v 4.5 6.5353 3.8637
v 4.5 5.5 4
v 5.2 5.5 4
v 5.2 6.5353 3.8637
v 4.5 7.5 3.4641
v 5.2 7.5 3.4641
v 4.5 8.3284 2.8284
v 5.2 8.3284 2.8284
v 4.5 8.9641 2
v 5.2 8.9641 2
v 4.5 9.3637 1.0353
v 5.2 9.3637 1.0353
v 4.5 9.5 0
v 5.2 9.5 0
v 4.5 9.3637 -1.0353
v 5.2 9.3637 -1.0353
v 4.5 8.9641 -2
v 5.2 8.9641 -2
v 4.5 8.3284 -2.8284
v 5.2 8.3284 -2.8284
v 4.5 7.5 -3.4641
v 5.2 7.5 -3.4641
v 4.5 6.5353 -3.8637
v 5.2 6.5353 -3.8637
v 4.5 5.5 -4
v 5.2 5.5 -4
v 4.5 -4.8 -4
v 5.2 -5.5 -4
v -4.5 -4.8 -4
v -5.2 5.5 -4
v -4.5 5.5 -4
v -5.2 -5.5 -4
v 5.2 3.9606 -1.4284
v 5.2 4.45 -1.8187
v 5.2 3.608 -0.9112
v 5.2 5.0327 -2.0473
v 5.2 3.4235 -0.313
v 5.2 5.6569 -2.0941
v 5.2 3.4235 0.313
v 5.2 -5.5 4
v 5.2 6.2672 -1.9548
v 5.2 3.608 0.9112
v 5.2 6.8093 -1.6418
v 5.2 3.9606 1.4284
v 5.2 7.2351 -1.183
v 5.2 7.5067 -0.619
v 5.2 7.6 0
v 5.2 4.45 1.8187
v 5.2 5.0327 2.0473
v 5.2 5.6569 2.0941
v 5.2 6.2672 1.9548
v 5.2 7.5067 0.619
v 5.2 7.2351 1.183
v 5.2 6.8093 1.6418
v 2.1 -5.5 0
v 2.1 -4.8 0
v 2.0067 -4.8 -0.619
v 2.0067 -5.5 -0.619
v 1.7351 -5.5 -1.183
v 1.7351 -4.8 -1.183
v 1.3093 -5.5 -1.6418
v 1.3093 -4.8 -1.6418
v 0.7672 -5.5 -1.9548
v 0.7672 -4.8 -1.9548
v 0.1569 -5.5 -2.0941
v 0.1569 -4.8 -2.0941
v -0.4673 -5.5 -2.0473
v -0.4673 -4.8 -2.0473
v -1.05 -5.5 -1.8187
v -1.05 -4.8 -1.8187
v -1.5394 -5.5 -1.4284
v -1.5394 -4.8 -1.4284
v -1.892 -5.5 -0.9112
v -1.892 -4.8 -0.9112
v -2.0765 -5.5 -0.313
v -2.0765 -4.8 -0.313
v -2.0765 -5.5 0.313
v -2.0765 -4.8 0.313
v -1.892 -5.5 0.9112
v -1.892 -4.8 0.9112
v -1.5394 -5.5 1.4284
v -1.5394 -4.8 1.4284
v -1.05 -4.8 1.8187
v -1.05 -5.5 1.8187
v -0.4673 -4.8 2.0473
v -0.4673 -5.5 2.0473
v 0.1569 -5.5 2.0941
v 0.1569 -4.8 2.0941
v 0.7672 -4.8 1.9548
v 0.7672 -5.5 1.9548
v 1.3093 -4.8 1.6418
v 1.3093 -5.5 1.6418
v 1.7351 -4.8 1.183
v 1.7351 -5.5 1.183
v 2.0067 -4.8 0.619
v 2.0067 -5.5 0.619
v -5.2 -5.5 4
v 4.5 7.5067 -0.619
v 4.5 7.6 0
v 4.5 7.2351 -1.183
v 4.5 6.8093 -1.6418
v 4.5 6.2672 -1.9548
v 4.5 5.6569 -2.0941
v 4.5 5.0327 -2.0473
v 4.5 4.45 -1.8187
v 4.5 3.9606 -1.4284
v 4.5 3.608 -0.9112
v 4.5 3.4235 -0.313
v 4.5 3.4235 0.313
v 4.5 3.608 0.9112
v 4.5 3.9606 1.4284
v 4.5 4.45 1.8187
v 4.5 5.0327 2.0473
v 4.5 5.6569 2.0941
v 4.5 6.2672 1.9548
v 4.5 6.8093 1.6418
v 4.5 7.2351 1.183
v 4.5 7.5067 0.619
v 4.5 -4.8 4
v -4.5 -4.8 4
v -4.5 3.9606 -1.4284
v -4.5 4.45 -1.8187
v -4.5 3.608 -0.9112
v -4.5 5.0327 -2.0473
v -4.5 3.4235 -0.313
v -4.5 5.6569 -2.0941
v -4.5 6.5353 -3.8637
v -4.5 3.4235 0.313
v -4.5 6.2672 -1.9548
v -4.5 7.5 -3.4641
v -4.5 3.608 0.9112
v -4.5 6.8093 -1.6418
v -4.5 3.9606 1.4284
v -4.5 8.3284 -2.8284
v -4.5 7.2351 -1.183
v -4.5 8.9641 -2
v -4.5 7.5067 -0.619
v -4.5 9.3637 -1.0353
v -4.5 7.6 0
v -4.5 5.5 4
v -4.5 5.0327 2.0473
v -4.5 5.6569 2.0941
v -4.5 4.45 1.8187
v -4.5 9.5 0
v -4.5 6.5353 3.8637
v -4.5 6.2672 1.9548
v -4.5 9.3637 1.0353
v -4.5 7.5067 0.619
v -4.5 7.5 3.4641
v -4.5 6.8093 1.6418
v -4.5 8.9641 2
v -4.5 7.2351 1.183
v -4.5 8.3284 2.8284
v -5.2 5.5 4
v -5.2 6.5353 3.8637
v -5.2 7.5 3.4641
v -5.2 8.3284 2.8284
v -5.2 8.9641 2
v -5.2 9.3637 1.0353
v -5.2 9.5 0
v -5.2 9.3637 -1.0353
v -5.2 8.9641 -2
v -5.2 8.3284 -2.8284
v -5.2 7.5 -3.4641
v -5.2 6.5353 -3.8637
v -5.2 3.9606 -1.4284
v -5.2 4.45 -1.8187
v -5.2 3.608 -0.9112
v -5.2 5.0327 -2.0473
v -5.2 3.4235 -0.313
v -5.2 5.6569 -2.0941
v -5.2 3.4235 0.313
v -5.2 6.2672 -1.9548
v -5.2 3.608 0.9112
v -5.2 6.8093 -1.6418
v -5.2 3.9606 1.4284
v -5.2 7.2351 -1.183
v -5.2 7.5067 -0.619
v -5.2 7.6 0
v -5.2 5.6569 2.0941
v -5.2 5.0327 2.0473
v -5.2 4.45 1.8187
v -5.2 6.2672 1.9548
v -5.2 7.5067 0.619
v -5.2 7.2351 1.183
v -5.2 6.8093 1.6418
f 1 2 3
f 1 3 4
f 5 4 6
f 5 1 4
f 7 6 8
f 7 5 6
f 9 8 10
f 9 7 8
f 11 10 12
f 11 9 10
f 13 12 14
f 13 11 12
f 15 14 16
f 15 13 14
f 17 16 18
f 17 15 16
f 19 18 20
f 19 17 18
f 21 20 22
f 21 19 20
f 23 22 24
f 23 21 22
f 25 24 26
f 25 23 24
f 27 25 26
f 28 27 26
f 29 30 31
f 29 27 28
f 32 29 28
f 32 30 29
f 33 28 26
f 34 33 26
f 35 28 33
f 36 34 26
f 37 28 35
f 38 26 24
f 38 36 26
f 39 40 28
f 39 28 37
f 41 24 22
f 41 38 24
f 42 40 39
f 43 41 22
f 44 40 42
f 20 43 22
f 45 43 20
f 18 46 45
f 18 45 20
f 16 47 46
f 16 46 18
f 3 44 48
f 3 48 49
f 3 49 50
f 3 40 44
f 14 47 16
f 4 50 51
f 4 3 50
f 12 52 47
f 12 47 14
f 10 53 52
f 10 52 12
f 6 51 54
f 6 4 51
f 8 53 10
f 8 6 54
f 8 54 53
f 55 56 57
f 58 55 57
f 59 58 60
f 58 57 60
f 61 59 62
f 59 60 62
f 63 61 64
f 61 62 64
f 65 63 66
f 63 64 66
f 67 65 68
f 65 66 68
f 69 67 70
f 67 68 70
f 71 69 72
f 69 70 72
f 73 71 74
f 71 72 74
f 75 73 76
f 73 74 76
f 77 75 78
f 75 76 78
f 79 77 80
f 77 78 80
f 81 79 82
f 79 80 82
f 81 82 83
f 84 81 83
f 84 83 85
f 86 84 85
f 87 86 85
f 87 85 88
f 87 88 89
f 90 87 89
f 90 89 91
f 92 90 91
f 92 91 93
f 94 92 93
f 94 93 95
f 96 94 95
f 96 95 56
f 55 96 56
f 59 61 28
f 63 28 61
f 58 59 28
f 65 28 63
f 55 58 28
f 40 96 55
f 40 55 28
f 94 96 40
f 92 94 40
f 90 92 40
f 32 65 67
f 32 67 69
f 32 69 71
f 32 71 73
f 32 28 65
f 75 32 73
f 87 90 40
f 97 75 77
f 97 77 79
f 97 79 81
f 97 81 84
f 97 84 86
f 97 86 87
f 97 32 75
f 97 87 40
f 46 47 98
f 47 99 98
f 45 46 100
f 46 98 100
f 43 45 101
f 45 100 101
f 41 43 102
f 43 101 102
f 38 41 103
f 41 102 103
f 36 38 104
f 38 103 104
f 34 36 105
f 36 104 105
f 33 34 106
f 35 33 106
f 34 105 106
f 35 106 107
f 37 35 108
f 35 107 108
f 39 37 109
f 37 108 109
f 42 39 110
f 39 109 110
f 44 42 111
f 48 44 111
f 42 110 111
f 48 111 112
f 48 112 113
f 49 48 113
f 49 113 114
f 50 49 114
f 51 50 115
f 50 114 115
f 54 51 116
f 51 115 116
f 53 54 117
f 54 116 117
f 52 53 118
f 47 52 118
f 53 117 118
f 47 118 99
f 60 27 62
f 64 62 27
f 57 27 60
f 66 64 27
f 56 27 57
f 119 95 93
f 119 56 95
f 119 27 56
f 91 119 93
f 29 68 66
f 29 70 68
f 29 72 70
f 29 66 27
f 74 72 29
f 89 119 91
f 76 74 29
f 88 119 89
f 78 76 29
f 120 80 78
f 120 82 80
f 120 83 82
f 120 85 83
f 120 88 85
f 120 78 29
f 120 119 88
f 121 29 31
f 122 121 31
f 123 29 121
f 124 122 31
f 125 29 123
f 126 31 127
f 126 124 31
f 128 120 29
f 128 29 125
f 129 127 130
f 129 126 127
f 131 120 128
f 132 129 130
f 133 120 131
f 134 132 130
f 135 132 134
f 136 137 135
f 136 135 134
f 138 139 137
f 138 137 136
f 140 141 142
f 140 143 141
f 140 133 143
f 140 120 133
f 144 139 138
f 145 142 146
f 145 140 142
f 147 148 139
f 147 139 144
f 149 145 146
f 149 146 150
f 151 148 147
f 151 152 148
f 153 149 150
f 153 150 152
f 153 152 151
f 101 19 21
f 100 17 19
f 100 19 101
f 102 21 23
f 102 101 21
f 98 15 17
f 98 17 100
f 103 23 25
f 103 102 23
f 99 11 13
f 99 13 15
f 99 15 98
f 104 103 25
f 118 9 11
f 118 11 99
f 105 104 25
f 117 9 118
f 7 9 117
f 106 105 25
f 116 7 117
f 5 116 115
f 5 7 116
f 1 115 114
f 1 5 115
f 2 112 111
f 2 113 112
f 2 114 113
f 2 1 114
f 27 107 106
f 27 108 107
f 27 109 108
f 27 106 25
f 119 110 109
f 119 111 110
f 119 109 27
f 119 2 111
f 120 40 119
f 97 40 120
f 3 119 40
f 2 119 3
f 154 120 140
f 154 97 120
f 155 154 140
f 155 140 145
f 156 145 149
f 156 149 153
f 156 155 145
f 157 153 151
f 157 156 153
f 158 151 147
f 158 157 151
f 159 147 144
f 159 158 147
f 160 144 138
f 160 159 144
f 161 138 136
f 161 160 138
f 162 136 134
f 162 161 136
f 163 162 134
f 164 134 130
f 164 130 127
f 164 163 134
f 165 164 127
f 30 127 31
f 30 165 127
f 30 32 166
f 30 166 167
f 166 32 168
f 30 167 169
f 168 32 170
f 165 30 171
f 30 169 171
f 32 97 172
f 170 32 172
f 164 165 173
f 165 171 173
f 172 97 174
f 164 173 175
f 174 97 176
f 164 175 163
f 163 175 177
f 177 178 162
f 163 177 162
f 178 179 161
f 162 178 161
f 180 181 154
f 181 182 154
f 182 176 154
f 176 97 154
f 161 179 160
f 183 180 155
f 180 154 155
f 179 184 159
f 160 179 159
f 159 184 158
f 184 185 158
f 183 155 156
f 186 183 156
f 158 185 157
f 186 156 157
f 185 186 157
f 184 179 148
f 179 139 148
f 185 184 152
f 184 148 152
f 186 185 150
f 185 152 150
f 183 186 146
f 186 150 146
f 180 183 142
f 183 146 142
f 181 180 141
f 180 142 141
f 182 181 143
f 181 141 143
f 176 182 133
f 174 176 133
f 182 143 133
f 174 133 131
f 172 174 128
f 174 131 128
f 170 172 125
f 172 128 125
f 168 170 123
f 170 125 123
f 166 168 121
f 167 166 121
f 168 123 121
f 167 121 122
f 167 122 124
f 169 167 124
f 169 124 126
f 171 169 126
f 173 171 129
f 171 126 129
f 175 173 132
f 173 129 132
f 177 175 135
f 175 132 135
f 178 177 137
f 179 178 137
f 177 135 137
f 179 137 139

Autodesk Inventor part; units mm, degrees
ref_plane "YZ Plane" through (0, 0, 0) normal (1, 0, 0) x (0, 1, 0)
ref_plane "XZ Plane" through (0, 0, 0) normal (0, 1, 0) x (-1, 0, 0)
ref_plane "XY Plane" through (0, 0, 0) normal (0, 0, 1) x (1, 0, 0)
sketch "스케치1" plane through (0, 0, 0) normal (1, 0, 0) x (0, 1, 0)
  line L0 (-5.5, 4) -> (5.5, 4)
  line L1 (5.5, 4) -> (5.5, -4)
  line L2 (5.5, -4) -> (-5.5, -4)
  line L3 (-5.5, -4) -> (-5.5, 4)
  line L4 (-5.5, 4) -> (5.5, -4) construction
  line L5 (5.5, 4) -> (-5.5, -4) construction
  circle A0 centre (5.5, 0) radius 4
  circle A1 centre (5.5, 0) radius 2.1
  point P0 (0, 0)
  dimension "d0" = 8
  dimension "d1" = 11
  dimension "d2" = 4.2
extrude "돌출1" add sketch "스케치1" along normal mid plane 10.4 contours L0 A0 L2 L3 | A0 L1 A1 | L1 A1 A0
sketch "스케치2" plane through (-5.2, -5.5, 4) normal (0, 0, 1) x (1, 0, 0)
  line L0 (0.7, 17.0117) -> (9.7, 17.0117)
  line L1 (9.7, 17.0117) -> (9.7, 0.7)
  line L2 (9.7, 0.7) -> (0.7, 0.7)
  line L3 (0.7, 0.7) -> (0.7, 17.0117)
  line L4 (0.7, 17.0117) -> (9.7, 0.7) construction
  line L5 (9.7, 17.0117) -> (0.7, 0.7) construction
  line L6 (0, 0) -> (0, 11) projected
  line L7 (0, 0) -> (10.4, 0) projected
  line L8 (10.4, 11) -> (10.4, 0) projected
  point P0 (5.2, 5.5)
  point P1 (5.2, 8.8559)
  dimension "d5" = 0.7
  dimension "d6" = 0.7
  dimension "d7" = 0.7
extrude "돌출2" cut sketch "스케치2" against normal through all
sketch "스케치3" plane through (-4.5, -4.8, 4) normal (0, 1, 0) x (1, 0, 0)
  circle A0 centre (4.5, 4) radius 2.1
  dimension "d10" = 4.2
extrude "돌출3" cut sketch "스케치3" against normal through all
properties part number "각도엑추에이터브라켓" material "스테인리스스틸"
